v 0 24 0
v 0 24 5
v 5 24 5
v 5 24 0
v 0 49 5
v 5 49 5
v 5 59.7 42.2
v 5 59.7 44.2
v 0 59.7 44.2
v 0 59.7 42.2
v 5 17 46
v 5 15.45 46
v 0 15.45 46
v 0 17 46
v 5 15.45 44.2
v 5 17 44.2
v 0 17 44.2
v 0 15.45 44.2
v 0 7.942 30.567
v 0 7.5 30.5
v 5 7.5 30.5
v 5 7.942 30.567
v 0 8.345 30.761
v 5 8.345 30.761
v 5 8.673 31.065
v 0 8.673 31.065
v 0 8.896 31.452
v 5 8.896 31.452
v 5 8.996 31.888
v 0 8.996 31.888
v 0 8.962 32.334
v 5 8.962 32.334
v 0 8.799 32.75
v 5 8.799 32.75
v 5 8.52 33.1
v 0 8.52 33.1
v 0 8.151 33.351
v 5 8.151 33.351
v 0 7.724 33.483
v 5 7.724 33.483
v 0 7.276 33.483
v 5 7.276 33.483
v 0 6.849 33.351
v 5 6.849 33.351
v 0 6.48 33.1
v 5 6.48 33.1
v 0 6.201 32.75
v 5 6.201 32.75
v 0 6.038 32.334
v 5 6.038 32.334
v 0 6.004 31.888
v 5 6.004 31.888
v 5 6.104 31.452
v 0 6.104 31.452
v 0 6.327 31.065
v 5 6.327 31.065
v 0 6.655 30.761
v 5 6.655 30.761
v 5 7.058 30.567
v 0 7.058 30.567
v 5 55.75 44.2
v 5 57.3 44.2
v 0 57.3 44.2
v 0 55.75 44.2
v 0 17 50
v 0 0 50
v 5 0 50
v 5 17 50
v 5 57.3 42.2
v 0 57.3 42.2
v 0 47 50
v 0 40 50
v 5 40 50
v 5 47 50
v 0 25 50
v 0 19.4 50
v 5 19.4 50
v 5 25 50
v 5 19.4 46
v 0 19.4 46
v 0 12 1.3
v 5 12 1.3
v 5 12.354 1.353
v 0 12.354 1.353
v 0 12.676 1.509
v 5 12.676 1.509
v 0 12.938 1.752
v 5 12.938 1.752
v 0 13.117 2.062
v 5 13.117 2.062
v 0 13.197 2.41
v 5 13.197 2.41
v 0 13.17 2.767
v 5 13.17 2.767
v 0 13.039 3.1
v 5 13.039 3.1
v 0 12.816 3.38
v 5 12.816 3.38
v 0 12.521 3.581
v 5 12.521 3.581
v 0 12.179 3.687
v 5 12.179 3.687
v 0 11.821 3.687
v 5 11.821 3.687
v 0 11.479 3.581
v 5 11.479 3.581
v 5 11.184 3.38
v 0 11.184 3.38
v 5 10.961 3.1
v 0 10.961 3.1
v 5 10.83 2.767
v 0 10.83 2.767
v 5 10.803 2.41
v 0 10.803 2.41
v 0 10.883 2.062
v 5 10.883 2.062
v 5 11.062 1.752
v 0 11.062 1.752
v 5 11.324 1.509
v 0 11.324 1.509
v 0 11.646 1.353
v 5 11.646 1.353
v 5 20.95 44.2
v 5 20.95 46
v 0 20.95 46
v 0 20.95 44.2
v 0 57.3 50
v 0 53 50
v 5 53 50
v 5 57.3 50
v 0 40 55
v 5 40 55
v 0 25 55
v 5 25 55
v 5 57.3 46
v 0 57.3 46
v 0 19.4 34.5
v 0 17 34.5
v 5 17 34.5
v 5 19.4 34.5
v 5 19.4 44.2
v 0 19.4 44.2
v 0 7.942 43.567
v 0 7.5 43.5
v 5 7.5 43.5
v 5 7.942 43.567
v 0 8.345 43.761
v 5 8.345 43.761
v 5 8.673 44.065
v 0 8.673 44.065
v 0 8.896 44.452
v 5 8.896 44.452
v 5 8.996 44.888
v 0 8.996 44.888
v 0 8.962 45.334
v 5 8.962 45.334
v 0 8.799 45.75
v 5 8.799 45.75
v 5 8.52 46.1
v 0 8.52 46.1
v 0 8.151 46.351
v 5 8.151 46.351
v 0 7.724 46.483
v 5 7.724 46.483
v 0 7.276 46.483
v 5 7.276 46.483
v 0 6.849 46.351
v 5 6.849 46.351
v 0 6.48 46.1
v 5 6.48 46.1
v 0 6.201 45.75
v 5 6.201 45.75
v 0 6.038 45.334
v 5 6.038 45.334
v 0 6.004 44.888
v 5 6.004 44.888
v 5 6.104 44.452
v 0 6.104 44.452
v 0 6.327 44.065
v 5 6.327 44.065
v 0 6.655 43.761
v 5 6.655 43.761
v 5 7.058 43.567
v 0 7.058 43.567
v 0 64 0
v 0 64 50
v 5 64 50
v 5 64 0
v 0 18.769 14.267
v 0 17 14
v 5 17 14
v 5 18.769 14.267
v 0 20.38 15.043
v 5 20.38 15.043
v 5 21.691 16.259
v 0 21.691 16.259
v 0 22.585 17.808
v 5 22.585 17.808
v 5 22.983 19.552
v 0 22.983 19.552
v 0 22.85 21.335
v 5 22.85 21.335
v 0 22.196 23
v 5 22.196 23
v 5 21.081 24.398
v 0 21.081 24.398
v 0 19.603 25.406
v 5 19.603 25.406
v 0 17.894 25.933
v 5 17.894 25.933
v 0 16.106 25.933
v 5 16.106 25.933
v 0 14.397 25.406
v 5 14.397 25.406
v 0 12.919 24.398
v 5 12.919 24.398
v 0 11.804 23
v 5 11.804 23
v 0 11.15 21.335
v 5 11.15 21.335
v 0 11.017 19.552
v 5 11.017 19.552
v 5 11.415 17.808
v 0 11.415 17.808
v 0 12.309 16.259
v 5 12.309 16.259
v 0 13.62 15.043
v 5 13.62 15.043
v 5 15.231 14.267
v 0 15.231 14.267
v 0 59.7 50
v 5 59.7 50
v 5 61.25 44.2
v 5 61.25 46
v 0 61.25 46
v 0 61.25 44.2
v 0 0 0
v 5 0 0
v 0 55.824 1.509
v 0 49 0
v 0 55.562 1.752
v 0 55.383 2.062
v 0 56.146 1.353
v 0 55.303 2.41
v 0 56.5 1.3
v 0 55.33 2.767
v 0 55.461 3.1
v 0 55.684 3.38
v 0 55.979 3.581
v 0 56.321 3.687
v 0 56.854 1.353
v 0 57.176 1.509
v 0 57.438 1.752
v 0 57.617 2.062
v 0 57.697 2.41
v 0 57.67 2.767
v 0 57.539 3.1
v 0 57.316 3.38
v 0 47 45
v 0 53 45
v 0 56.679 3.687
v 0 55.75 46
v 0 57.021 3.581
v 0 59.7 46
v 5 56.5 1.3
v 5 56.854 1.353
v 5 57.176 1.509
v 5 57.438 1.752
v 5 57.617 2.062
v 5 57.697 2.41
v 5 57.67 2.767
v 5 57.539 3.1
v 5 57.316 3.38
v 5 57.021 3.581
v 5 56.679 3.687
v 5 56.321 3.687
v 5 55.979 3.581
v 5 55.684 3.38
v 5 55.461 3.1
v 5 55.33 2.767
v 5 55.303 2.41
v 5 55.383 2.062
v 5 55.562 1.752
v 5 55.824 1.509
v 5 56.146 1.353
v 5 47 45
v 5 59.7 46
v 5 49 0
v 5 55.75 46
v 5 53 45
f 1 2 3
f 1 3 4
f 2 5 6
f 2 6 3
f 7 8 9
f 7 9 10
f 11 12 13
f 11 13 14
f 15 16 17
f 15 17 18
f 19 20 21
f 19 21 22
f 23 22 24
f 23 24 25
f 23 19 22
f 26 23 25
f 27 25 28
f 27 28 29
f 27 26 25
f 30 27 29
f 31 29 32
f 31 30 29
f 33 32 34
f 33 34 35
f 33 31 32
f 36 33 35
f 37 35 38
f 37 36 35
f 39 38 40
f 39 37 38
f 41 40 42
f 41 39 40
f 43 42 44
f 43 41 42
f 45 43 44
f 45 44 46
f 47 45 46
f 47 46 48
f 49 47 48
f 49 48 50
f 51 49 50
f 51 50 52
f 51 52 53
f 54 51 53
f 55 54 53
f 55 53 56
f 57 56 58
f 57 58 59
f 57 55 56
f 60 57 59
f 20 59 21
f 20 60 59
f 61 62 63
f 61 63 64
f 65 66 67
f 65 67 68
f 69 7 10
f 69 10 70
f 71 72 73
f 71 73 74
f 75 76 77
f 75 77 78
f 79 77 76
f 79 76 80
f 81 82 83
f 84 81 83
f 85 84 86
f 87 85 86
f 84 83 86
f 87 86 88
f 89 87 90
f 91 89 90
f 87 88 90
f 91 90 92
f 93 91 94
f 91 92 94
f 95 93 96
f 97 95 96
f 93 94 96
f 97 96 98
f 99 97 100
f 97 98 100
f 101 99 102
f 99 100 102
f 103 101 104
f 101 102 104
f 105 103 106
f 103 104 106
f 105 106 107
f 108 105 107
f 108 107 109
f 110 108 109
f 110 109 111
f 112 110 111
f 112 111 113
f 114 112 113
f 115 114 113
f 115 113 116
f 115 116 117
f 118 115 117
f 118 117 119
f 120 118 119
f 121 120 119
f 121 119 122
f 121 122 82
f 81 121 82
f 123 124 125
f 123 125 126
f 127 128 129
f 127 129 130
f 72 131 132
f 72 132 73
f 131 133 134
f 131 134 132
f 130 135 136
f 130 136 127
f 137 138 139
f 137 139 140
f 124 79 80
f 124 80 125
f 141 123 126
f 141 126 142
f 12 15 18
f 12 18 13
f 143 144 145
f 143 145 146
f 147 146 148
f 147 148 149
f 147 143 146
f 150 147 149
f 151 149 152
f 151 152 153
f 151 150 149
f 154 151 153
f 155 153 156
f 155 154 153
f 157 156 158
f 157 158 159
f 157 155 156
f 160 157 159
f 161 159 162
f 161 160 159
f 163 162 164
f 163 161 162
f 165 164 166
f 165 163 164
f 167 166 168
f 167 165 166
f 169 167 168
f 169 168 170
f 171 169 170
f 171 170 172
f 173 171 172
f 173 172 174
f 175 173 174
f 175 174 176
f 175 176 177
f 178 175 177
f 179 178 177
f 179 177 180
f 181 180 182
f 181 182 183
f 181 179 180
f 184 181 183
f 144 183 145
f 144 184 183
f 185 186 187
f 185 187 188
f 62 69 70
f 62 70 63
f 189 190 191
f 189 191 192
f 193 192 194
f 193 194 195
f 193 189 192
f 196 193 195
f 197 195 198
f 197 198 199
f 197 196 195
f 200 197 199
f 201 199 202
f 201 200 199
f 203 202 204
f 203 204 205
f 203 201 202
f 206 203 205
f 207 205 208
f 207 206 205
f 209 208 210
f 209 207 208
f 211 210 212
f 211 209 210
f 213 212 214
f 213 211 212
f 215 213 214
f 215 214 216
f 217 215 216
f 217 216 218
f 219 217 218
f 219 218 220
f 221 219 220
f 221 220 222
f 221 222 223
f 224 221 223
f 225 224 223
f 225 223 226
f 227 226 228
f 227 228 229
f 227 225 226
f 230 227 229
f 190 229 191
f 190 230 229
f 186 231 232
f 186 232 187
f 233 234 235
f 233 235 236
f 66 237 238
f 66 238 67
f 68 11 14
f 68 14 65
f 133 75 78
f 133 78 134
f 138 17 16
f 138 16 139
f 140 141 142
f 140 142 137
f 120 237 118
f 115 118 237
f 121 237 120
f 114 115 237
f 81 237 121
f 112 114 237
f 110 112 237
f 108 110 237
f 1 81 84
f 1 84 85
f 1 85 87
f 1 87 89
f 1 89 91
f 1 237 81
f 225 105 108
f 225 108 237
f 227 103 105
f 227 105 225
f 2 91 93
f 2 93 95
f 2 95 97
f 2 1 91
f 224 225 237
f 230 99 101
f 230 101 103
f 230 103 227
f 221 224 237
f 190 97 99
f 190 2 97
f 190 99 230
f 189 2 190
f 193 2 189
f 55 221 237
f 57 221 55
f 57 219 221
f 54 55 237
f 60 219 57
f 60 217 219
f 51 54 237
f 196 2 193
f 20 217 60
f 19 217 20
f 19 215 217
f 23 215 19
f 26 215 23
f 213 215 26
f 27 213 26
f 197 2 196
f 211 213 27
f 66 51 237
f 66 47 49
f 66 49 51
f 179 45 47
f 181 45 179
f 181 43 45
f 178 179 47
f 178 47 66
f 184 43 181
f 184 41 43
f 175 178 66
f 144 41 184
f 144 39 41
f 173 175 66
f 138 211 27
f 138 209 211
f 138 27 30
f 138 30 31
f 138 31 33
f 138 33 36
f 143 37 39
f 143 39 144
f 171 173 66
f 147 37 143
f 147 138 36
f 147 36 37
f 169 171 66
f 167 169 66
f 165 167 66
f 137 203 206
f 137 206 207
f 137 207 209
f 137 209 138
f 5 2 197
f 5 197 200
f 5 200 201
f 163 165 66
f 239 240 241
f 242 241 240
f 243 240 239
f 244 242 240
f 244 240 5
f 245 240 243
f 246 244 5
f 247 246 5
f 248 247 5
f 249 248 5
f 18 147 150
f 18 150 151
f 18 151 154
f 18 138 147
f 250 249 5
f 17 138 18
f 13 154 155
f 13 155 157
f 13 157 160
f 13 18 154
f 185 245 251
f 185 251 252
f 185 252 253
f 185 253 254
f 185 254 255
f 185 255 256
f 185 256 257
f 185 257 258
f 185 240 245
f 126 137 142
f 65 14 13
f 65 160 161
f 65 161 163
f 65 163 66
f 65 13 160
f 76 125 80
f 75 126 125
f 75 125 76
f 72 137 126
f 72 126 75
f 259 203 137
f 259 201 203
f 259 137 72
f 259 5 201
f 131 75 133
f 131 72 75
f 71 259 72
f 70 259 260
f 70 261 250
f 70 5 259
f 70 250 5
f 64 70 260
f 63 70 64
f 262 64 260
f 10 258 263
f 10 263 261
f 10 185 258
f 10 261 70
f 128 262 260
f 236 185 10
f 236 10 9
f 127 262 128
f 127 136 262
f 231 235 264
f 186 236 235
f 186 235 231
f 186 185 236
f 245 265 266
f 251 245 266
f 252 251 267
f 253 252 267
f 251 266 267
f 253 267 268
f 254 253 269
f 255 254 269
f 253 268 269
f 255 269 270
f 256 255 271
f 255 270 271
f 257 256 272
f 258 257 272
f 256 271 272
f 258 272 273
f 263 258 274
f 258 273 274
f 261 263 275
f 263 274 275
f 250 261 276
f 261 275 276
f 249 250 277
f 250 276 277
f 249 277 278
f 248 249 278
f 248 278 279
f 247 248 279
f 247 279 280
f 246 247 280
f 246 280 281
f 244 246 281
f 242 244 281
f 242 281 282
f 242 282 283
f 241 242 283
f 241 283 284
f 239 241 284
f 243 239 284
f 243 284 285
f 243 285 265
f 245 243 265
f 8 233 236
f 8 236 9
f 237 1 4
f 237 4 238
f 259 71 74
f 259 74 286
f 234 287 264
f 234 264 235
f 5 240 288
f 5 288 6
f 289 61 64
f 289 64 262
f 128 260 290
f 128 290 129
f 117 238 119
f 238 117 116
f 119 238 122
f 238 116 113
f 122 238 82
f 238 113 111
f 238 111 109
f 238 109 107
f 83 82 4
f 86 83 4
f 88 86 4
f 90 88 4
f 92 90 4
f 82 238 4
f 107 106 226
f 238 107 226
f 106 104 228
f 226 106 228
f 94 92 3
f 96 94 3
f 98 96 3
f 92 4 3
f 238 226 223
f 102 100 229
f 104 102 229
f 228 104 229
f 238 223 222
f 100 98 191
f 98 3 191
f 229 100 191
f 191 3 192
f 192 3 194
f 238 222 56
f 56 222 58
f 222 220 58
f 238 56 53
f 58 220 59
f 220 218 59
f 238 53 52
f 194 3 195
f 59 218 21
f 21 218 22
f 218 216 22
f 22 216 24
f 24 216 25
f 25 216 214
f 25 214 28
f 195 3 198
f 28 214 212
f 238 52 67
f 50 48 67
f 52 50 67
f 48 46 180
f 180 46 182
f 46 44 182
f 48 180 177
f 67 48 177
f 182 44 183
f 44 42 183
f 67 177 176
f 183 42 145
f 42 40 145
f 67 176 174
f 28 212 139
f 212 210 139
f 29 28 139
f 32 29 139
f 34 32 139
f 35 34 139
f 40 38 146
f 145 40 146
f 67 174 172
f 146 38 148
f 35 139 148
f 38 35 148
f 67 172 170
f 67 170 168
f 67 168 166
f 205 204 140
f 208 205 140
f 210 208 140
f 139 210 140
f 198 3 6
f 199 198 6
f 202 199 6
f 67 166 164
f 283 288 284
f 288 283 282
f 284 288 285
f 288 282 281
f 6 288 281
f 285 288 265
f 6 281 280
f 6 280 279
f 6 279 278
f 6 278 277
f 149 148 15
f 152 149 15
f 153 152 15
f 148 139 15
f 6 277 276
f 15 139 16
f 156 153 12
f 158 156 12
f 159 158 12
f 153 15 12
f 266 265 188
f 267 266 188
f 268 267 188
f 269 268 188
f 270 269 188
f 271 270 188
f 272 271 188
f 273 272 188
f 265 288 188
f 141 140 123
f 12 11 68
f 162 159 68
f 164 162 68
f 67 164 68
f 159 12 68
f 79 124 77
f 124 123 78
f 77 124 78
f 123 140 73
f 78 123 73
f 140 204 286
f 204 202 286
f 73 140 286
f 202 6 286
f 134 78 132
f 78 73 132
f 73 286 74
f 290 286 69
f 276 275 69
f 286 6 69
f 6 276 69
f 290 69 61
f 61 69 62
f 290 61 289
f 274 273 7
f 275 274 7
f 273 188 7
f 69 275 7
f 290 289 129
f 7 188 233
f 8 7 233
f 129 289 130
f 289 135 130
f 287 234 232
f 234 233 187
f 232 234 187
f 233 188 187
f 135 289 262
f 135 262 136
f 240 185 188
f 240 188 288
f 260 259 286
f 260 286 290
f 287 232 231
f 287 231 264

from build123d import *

# Parameters (mm, degrees)
SKETCH1_R           = 6
SKETCH1_R_2         = 1.5
SKETCH1_W           = 8
SKETCH1_H           = 2.4
BOSS_EXTRUDE1_DEPTH = 5
SKETCH2_R           = 1.2
CUT_EXTRUDE1_DEPTH  = 6


with BuildPart() as part:
    # Sketch1 → Boss-Extrude1 (new body)
    with BuildSketch(Plane(origin=(0, 0, 0), x_dir=(0, 0, -1), z_dir=(1, 0, 0))):
        Polygon((0, 0), (-50, 0), (-50, 25), (-55, 25), (-55, 40), (-50, 40), (-50, 47), (-45, 47), (-45, 53), (-50, 53), (-50, 64), (0, 64), (0, 49), (-5, 49), (-5, 24), (0, 24), align=None)
        with Locations((-20, 17)):
            Circle(SKETCH1_R, mode=Mode.SUBTRACT)
        with Locations((-45, 7.5)):
            Circle(SKETCH1_R_2, mode=Mode.SUBTRACT)
        with Locations((-32, 7.5)):
            Circle(SKETCH1_R_2, mode=Mode.SUBTRACT)
        with Locations((-38.5, 18.2)):
            Rectangle(SKETCH1_W, SKETCH1_H, mode=Mode.SUBTRACT)
    extrude(amount=BOSS_EXTRUDE1_DEPTH)

    # Sketch2 → Cut-Extrude1 (cut, through all)
    with BuildSketch(Plane(origin=(5, 0, 0), x_dir=(0, 0, -1), z_dir=(1, 0, 0))):
        with Locations((-2.5, 56.5)):
            Circle(SKETCH2_R)
        with Locations((-2.5, 12)):
            Circle(SKETCH2_R)
        Polygon((-50, 59.7), (-46, 59.7), (-46, 61.25), (-44.2, 61.25), (-44.2, 59.7), (-42.2, 59.7), (-42.2, 57.3), (-44.2, 57.3), (-44.2, 55.75), (-46, 55.75), (-46, 57.3), (-50, 57.3), align=None)
        Polygon((-44.2, 19.4), (-42.2, 19.4), (-42.2, 17), (-44.2, 17), (-44.2, 15.45), (-46, 15.45), (-46, 17), (-50, 17), (-50, 19.4), (-46, 19.4), (-46, 20.95), (-44.2, 20.95), align=None)
    extrude(amount=-CUT_EXTRUDE1_DEPTH, mode=Mode.SUBTRACT)


solid = part.part
